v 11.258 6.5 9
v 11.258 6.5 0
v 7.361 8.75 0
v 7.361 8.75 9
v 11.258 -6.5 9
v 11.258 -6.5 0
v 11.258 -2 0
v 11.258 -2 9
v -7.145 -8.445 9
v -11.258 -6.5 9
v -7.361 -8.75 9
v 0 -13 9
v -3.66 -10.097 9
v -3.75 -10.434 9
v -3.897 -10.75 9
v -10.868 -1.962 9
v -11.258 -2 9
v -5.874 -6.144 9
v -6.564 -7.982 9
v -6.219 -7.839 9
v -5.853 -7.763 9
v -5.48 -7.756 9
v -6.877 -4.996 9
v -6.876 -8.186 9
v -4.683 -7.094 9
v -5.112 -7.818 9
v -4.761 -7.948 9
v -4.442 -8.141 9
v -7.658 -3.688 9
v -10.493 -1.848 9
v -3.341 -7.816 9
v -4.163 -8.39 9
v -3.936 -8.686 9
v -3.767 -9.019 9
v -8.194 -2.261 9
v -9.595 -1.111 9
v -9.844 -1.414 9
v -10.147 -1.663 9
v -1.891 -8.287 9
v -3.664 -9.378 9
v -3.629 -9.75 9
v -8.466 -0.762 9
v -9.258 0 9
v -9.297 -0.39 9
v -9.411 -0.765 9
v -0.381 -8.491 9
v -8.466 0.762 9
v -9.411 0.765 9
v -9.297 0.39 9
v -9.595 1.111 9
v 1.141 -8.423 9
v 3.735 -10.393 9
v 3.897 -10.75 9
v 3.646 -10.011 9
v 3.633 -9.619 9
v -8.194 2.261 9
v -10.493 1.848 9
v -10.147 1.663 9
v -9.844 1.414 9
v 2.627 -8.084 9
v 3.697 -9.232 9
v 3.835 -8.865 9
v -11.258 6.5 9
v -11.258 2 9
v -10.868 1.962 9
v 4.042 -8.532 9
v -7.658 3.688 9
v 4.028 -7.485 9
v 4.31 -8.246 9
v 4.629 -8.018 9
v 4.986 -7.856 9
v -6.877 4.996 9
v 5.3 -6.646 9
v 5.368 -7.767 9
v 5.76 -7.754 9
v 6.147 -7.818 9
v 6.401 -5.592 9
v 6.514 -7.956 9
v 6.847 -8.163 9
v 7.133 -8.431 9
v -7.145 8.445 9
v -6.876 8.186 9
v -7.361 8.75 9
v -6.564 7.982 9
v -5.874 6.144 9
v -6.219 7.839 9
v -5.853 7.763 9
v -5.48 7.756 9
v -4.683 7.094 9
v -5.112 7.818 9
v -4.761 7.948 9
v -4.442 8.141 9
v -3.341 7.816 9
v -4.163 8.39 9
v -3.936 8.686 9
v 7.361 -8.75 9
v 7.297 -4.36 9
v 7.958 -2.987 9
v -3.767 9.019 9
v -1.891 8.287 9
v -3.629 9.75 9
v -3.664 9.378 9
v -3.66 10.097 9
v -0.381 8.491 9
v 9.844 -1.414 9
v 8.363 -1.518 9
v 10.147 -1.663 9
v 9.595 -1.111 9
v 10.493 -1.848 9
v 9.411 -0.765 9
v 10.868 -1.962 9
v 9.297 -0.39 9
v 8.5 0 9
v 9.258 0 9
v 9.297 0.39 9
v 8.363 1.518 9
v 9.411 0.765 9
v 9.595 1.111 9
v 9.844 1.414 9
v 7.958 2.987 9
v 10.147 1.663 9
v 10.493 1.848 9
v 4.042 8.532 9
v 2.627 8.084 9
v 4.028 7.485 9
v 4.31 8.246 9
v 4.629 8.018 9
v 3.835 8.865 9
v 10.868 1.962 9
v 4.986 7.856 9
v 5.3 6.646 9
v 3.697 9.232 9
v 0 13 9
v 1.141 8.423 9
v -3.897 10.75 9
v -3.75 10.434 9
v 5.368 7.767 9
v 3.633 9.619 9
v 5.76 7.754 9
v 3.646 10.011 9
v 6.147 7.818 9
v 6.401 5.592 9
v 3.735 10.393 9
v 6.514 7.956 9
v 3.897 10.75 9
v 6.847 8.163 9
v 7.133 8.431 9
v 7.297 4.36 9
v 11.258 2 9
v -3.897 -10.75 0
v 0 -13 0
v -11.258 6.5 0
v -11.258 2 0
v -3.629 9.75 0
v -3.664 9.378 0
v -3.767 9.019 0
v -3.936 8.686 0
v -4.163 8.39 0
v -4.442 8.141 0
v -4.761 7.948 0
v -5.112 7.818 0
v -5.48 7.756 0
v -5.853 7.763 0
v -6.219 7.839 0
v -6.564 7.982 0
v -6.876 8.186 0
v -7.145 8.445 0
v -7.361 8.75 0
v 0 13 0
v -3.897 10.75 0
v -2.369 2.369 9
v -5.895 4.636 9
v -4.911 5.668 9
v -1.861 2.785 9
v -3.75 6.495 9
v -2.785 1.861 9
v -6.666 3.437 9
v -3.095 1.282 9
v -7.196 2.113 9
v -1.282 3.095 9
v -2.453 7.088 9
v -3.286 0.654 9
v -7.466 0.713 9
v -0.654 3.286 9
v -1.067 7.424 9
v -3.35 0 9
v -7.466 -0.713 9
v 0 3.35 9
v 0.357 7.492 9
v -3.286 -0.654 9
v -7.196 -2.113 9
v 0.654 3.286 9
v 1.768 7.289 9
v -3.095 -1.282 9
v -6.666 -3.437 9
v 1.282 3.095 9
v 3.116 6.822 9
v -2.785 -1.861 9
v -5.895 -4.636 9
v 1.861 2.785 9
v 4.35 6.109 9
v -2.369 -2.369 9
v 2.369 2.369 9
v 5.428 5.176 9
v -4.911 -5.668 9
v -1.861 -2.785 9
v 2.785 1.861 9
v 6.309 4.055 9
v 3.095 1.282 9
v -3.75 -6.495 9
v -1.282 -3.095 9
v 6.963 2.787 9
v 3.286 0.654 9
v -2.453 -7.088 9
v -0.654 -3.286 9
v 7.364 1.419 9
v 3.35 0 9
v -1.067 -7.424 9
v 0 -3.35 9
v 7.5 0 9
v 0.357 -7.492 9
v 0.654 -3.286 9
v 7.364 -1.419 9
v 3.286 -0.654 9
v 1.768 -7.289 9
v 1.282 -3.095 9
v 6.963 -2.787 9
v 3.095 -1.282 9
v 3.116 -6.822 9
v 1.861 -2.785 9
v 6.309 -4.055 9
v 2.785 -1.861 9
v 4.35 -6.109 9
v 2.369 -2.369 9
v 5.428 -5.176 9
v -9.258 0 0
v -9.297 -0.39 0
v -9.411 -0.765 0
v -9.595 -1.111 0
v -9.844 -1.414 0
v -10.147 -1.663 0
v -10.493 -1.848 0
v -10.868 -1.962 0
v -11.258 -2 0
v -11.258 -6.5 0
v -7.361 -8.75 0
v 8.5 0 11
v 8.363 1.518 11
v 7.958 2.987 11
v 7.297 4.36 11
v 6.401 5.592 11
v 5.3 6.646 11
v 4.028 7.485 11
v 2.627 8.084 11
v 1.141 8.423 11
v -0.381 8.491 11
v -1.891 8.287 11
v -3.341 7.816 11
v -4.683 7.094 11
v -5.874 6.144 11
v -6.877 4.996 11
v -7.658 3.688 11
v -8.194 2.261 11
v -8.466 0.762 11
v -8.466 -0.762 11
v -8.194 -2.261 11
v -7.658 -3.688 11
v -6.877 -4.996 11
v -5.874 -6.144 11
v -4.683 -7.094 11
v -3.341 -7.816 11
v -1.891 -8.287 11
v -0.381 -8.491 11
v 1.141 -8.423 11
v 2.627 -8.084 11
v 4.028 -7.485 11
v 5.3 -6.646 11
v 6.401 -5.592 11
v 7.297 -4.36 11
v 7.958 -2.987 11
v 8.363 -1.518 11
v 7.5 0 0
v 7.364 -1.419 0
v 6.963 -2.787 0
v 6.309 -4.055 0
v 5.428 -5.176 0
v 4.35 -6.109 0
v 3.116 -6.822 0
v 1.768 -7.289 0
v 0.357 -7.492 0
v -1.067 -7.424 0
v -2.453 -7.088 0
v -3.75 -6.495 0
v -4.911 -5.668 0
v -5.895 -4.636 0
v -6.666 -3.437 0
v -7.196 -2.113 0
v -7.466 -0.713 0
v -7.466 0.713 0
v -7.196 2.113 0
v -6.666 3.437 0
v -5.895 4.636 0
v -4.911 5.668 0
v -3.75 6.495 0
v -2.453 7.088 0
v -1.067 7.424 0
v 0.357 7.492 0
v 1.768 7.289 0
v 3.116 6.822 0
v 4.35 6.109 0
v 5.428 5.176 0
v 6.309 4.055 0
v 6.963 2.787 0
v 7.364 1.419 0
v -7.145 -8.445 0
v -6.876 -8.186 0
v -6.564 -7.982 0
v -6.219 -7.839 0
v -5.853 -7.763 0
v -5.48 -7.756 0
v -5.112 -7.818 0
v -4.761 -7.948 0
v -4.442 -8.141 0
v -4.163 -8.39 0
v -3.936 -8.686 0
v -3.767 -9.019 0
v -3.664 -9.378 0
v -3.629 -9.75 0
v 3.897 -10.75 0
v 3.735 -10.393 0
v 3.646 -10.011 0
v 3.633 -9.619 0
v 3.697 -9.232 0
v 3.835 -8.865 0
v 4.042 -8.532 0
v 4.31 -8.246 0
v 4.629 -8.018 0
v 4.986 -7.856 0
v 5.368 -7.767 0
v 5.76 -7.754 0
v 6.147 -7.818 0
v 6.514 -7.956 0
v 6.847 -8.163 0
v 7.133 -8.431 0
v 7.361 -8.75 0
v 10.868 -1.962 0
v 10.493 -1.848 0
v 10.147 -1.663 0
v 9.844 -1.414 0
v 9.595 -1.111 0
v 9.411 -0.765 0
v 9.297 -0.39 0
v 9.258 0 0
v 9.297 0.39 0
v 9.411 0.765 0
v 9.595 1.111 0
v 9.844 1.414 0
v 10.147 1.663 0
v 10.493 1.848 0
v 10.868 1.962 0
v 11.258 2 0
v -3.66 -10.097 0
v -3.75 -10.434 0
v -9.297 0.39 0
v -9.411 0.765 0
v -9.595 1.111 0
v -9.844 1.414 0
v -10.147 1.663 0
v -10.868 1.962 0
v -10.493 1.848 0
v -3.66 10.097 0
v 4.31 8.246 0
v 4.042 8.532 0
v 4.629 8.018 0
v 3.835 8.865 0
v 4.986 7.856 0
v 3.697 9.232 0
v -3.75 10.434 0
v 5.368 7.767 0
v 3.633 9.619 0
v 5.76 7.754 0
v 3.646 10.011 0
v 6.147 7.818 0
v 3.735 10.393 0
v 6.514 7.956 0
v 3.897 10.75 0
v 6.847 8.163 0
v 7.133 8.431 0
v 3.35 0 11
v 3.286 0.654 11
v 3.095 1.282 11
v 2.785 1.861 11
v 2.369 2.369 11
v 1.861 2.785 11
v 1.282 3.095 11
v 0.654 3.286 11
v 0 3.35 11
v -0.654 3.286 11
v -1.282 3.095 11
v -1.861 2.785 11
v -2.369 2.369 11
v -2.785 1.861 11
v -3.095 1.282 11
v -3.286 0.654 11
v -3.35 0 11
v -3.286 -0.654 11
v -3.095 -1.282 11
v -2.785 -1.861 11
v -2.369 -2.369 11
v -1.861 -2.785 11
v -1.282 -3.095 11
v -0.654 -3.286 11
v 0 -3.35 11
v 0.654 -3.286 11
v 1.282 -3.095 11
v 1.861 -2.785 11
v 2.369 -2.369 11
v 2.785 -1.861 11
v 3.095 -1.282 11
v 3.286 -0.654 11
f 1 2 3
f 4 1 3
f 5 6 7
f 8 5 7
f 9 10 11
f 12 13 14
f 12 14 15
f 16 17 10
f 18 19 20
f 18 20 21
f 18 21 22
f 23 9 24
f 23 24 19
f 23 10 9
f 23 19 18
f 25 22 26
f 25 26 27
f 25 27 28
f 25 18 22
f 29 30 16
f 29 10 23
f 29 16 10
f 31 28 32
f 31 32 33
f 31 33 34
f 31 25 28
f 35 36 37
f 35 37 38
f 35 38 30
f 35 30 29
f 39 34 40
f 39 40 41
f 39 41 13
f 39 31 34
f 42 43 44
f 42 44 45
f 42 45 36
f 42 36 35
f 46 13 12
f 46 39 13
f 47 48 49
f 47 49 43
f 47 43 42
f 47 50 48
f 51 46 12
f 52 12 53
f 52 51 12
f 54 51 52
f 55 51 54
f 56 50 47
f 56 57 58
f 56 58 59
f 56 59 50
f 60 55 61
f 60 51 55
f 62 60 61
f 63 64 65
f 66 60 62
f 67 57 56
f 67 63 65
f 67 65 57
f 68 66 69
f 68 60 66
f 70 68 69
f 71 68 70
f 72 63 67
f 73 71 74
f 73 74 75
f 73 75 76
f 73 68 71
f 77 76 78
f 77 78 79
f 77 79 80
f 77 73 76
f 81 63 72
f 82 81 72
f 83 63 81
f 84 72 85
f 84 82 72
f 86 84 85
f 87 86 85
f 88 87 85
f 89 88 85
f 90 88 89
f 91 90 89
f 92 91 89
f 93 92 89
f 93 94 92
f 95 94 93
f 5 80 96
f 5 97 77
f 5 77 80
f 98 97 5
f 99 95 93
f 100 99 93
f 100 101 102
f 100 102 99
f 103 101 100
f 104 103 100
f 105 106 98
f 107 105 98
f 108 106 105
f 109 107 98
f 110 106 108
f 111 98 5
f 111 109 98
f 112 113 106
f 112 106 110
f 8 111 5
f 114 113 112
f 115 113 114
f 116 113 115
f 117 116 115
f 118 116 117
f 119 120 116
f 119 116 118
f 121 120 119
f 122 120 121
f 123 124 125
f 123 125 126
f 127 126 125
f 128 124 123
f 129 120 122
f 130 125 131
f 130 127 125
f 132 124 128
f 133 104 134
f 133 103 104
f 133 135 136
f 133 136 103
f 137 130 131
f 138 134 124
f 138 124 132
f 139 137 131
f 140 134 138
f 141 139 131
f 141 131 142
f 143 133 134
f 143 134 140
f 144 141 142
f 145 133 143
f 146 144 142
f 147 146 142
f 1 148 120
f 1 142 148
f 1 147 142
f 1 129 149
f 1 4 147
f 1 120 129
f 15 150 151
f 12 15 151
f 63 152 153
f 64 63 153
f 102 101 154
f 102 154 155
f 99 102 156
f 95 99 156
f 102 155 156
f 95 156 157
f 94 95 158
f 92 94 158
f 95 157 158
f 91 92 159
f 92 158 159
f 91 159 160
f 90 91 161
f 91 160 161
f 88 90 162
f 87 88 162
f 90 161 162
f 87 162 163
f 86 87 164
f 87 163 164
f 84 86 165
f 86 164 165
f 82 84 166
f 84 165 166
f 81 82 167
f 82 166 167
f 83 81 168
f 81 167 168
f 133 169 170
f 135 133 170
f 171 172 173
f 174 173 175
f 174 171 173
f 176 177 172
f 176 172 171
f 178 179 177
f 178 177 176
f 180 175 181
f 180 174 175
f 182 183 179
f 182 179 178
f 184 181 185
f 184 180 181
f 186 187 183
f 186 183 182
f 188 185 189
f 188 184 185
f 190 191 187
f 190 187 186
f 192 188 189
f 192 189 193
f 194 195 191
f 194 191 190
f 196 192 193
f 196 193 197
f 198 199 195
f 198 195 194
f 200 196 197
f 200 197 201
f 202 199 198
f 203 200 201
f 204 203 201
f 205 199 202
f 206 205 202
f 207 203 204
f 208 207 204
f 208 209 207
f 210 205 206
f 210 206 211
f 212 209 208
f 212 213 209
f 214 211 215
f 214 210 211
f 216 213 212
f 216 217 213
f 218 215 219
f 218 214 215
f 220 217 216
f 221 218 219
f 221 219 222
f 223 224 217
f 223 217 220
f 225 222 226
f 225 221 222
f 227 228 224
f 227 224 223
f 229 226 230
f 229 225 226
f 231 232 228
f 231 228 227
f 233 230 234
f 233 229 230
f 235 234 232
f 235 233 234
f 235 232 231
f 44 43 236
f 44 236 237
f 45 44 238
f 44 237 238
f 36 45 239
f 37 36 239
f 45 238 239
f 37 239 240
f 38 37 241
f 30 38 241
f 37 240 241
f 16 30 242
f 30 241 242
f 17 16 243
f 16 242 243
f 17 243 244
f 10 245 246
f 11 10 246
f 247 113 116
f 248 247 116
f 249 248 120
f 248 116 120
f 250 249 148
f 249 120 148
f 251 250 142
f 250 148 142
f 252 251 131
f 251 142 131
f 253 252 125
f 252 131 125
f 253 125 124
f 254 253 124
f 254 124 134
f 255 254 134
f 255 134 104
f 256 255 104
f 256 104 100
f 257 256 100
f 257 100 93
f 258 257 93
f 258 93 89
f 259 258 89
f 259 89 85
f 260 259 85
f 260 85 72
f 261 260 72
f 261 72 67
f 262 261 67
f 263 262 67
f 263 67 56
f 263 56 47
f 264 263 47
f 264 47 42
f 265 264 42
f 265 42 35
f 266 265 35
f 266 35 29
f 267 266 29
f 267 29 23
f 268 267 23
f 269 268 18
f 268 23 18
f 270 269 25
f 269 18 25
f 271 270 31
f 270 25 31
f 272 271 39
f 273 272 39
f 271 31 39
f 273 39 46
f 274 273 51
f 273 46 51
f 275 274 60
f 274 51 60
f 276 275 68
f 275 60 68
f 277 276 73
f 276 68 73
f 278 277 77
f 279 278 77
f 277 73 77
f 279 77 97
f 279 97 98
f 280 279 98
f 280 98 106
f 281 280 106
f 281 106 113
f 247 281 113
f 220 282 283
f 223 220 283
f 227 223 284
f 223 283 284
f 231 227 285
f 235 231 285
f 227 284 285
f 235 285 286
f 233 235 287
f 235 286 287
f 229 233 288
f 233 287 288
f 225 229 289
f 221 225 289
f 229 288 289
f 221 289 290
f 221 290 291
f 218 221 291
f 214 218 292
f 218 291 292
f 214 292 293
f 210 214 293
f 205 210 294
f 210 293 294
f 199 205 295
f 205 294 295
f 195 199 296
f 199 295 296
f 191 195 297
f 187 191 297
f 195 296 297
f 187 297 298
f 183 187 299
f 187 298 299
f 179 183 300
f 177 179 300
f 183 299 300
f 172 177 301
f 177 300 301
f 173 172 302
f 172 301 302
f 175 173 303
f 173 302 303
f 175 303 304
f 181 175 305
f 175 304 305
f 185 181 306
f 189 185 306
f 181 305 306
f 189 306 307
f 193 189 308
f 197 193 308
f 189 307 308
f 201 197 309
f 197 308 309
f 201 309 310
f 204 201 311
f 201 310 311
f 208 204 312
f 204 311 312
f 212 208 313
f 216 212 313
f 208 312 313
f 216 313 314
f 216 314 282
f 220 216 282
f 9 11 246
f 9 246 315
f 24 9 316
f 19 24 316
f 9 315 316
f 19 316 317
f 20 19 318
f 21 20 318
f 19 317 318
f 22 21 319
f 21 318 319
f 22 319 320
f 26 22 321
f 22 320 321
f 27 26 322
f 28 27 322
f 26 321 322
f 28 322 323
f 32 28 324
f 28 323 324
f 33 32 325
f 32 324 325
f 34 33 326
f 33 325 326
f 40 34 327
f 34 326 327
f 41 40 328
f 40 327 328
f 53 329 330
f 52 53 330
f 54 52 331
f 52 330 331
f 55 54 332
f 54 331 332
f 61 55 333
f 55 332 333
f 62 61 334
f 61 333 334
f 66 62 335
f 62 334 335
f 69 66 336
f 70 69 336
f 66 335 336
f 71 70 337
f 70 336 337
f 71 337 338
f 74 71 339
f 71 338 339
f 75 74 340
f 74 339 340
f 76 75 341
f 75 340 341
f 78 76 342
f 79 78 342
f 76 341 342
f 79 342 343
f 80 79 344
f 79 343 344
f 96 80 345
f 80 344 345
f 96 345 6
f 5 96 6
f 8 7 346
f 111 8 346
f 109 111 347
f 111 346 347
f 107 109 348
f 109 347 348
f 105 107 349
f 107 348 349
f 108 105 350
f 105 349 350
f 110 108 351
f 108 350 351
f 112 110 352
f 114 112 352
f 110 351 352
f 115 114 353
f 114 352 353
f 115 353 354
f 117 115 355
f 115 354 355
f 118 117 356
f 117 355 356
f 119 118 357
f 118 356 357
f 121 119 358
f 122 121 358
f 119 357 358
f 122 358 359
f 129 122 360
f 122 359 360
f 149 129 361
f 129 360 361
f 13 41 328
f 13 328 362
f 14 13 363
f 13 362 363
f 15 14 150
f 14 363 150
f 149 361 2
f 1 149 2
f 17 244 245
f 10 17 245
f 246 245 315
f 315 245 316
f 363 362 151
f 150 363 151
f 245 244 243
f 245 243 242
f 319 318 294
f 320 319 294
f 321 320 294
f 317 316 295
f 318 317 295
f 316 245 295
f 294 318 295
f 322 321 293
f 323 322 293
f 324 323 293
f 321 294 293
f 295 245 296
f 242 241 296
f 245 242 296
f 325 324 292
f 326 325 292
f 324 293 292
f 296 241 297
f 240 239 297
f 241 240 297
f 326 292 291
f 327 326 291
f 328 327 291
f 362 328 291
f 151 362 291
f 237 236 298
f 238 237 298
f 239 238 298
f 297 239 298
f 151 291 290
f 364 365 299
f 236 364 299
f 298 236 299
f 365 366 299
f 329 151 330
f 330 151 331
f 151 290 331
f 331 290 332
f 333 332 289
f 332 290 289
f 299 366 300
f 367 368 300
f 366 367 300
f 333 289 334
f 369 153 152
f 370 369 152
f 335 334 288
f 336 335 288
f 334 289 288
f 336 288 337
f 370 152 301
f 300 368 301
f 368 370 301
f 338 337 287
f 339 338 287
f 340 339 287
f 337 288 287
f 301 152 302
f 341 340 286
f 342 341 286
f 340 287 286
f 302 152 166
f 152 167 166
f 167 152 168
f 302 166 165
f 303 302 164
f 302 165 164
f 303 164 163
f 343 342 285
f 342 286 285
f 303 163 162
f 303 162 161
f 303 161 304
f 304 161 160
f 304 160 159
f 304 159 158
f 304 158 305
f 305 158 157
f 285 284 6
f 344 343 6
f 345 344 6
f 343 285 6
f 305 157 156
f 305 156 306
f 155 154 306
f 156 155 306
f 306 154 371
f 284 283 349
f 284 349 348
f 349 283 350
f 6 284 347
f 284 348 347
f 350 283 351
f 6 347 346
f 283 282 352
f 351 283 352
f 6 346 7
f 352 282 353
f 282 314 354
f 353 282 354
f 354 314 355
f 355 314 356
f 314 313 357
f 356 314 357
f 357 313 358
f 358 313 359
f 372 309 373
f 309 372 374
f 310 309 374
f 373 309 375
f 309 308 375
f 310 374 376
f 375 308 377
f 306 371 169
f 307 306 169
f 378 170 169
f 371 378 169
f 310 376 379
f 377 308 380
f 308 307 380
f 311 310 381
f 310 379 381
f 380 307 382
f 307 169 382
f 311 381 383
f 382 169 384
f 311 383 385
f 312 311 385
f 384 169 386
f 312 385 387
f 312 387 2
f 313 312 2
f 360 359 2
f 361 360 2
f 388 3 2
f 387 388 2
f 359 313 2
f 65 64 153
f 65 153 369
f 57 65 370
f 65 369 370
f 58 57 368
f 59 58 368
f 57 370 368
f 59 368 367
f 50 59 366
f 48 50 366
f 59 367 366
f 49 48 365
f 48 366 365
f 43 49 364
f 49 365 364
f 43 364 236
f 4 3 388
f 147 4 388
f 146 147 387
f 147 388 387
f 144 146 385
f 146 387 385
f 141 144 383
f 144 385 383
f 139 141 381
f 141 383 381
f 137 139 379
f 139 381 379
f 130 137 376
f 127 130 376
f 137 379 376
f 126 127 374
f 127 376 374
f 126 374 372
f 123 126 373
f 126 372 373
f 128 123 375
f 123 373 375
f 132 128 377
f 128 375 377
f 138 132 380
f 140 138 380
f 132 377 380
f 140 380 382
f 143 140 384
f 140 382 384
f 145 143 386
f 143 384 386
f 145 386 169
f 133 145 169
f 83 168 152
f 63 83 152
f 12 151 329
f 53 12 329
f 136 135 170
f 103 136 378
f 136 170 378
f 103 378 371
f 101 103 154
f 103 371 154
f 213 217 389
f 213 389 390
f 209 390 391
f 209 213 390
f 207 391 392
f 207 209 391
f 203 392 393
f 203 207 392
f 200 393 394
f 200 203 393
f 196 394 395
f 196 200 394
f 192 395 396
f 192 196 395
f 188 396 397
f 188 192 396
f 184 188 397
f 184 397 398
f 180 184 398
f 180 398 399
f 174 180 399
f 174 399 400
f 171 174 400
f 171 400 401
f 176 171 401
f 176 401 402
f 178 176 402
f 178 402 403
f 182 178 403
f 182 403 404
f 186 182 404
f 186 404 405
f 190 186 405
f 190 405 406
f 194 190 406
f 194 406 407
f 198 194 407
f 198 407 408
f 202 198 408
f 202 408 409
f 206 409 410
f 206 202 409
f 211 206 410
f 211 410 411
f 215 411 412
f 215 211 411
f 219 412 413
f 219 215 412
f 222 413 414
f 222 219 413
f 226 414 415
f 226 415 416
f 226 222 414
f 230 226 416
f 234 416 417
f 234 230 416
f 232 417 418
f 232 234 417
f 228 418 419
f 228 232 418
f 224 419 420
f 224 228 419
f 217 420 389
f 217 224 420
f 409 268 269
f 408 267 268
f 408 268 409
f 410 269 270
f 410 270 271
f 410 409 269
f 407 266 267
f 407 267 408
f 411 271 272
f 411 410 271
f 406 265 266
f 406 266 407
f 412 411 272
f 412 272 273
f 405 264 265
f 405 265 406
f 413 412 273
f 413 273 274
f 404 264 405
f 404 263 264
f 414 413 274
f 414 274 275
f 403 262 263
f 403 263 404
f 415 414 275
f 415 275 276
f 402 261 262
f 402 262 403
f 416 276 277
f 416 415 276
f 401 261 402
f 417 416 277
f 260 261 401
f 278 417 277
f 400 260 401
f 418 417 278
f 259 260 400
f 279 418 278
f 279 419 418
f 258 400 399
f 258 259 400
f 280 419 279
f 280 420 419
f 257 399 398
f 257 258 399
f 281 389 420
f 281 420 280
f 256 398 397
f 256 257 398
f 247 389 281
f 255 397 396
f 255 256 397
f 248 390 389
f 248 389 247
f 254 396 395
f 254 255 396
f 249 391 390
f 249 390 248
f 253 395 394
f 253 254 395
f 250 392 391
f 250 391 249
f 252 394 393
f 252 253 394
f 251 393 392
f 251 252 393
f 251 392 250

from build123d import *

# Parameters (mm, degrees)
F0_R     = 8.5
F1_DEPTH = 9
F0_R_2   = 3.35
F2_DEPTH = 11
F3_R     = 7.5
F3_R_2   = 3.35
F4_DEPTH = 9


with BuildPart() as f1:
    # F0 (on Top) → F1 (new body)
    with BuildSketch(Plane.XY):
        with BuildLine():
            Line((-11.25833, -2), (-11.25833, -6.5))
            Line((-11.25833, -6.5), (-7.361216, -8.75))
            ThreePointArc((-7.361216, -8.75), (-5.111527, -7.818148), (-3.629165, -9.75))
            ThreePointArc((-3.629165, -9.75), (-3.697313, -10.267638), (-3.897114, -10.75))
            Line((-3.897114, -10.75), (0, -13))
            Line((0, -13), (3.897114, -10.75))
            ThreePointArc((3.897114, -10.75), (4.629165, -8.017949), (7.361216, -8.75))
            Line((7.361216, -8.75), (11.25833, -6.5))
            Line((11.25833, -6.5), (11.25833, -2))
            ThreePointArc((11.25833, -2), (9.25833, 0), (11.25833, 2))
            Line((11.25833, 2), (11.25833, 6.5))
            Line((11.25833, 6.5), (7.361216, 8.75))
            ThreePointArc((7.361216, 8.75), (4.629165, 8.017949), (3.897114, 10.75))
            Line((3.897114, 10.75), (0, 13))
            Line((0, 13), (-3.897114, 10.75))
            ThreePointArc((-3.897114, 10.75), (-3.697313, 10.267638), (-3.629165, 9.75))
            ThreePointArc((-3.629165, 9.75), (-5.111527, 7.818148), (-7.361216, 8.75))
            Line((-7.361216, 8.75), (-11.25833, 6.5))
            Line((-11.25833, 6.5), (-11.25833, 2))
            ThreePointArc((-11.25833, 2), (-9.844117, 1.414214), (-9.25833, 0))
            ThreePointArc((-9.25833, 0), (-9.844117, -1.414214), (-11.25833, -2))
        make_face()
        Circle(F0_R, mode=Mode.SUBTRACT)
    extrude(amount=F1_DEPTH)

    # F0 (on Top) → F2 (join)
    with BuildSketch(Plane.XY):
        Circle(F0_R)
        Circle(F0_R_2, mode=Mode.SUBTRACT)
    extrude(amount=F2_DEPTH)

    # F3 (on face) → F4 (cut)
    with BuildSketch(Plane(origin=(0, 0, 0), x_dir=(1, 0, 0), z_dir=(0, 0, -1))):
        Circle(F3_R)
        Circle(F3_R_2, mode=Mode.SUBTRACT)
    extrude(amount=-F4_DEPTH, mode=Mode.SUBTRACT)


solid = f1.part
